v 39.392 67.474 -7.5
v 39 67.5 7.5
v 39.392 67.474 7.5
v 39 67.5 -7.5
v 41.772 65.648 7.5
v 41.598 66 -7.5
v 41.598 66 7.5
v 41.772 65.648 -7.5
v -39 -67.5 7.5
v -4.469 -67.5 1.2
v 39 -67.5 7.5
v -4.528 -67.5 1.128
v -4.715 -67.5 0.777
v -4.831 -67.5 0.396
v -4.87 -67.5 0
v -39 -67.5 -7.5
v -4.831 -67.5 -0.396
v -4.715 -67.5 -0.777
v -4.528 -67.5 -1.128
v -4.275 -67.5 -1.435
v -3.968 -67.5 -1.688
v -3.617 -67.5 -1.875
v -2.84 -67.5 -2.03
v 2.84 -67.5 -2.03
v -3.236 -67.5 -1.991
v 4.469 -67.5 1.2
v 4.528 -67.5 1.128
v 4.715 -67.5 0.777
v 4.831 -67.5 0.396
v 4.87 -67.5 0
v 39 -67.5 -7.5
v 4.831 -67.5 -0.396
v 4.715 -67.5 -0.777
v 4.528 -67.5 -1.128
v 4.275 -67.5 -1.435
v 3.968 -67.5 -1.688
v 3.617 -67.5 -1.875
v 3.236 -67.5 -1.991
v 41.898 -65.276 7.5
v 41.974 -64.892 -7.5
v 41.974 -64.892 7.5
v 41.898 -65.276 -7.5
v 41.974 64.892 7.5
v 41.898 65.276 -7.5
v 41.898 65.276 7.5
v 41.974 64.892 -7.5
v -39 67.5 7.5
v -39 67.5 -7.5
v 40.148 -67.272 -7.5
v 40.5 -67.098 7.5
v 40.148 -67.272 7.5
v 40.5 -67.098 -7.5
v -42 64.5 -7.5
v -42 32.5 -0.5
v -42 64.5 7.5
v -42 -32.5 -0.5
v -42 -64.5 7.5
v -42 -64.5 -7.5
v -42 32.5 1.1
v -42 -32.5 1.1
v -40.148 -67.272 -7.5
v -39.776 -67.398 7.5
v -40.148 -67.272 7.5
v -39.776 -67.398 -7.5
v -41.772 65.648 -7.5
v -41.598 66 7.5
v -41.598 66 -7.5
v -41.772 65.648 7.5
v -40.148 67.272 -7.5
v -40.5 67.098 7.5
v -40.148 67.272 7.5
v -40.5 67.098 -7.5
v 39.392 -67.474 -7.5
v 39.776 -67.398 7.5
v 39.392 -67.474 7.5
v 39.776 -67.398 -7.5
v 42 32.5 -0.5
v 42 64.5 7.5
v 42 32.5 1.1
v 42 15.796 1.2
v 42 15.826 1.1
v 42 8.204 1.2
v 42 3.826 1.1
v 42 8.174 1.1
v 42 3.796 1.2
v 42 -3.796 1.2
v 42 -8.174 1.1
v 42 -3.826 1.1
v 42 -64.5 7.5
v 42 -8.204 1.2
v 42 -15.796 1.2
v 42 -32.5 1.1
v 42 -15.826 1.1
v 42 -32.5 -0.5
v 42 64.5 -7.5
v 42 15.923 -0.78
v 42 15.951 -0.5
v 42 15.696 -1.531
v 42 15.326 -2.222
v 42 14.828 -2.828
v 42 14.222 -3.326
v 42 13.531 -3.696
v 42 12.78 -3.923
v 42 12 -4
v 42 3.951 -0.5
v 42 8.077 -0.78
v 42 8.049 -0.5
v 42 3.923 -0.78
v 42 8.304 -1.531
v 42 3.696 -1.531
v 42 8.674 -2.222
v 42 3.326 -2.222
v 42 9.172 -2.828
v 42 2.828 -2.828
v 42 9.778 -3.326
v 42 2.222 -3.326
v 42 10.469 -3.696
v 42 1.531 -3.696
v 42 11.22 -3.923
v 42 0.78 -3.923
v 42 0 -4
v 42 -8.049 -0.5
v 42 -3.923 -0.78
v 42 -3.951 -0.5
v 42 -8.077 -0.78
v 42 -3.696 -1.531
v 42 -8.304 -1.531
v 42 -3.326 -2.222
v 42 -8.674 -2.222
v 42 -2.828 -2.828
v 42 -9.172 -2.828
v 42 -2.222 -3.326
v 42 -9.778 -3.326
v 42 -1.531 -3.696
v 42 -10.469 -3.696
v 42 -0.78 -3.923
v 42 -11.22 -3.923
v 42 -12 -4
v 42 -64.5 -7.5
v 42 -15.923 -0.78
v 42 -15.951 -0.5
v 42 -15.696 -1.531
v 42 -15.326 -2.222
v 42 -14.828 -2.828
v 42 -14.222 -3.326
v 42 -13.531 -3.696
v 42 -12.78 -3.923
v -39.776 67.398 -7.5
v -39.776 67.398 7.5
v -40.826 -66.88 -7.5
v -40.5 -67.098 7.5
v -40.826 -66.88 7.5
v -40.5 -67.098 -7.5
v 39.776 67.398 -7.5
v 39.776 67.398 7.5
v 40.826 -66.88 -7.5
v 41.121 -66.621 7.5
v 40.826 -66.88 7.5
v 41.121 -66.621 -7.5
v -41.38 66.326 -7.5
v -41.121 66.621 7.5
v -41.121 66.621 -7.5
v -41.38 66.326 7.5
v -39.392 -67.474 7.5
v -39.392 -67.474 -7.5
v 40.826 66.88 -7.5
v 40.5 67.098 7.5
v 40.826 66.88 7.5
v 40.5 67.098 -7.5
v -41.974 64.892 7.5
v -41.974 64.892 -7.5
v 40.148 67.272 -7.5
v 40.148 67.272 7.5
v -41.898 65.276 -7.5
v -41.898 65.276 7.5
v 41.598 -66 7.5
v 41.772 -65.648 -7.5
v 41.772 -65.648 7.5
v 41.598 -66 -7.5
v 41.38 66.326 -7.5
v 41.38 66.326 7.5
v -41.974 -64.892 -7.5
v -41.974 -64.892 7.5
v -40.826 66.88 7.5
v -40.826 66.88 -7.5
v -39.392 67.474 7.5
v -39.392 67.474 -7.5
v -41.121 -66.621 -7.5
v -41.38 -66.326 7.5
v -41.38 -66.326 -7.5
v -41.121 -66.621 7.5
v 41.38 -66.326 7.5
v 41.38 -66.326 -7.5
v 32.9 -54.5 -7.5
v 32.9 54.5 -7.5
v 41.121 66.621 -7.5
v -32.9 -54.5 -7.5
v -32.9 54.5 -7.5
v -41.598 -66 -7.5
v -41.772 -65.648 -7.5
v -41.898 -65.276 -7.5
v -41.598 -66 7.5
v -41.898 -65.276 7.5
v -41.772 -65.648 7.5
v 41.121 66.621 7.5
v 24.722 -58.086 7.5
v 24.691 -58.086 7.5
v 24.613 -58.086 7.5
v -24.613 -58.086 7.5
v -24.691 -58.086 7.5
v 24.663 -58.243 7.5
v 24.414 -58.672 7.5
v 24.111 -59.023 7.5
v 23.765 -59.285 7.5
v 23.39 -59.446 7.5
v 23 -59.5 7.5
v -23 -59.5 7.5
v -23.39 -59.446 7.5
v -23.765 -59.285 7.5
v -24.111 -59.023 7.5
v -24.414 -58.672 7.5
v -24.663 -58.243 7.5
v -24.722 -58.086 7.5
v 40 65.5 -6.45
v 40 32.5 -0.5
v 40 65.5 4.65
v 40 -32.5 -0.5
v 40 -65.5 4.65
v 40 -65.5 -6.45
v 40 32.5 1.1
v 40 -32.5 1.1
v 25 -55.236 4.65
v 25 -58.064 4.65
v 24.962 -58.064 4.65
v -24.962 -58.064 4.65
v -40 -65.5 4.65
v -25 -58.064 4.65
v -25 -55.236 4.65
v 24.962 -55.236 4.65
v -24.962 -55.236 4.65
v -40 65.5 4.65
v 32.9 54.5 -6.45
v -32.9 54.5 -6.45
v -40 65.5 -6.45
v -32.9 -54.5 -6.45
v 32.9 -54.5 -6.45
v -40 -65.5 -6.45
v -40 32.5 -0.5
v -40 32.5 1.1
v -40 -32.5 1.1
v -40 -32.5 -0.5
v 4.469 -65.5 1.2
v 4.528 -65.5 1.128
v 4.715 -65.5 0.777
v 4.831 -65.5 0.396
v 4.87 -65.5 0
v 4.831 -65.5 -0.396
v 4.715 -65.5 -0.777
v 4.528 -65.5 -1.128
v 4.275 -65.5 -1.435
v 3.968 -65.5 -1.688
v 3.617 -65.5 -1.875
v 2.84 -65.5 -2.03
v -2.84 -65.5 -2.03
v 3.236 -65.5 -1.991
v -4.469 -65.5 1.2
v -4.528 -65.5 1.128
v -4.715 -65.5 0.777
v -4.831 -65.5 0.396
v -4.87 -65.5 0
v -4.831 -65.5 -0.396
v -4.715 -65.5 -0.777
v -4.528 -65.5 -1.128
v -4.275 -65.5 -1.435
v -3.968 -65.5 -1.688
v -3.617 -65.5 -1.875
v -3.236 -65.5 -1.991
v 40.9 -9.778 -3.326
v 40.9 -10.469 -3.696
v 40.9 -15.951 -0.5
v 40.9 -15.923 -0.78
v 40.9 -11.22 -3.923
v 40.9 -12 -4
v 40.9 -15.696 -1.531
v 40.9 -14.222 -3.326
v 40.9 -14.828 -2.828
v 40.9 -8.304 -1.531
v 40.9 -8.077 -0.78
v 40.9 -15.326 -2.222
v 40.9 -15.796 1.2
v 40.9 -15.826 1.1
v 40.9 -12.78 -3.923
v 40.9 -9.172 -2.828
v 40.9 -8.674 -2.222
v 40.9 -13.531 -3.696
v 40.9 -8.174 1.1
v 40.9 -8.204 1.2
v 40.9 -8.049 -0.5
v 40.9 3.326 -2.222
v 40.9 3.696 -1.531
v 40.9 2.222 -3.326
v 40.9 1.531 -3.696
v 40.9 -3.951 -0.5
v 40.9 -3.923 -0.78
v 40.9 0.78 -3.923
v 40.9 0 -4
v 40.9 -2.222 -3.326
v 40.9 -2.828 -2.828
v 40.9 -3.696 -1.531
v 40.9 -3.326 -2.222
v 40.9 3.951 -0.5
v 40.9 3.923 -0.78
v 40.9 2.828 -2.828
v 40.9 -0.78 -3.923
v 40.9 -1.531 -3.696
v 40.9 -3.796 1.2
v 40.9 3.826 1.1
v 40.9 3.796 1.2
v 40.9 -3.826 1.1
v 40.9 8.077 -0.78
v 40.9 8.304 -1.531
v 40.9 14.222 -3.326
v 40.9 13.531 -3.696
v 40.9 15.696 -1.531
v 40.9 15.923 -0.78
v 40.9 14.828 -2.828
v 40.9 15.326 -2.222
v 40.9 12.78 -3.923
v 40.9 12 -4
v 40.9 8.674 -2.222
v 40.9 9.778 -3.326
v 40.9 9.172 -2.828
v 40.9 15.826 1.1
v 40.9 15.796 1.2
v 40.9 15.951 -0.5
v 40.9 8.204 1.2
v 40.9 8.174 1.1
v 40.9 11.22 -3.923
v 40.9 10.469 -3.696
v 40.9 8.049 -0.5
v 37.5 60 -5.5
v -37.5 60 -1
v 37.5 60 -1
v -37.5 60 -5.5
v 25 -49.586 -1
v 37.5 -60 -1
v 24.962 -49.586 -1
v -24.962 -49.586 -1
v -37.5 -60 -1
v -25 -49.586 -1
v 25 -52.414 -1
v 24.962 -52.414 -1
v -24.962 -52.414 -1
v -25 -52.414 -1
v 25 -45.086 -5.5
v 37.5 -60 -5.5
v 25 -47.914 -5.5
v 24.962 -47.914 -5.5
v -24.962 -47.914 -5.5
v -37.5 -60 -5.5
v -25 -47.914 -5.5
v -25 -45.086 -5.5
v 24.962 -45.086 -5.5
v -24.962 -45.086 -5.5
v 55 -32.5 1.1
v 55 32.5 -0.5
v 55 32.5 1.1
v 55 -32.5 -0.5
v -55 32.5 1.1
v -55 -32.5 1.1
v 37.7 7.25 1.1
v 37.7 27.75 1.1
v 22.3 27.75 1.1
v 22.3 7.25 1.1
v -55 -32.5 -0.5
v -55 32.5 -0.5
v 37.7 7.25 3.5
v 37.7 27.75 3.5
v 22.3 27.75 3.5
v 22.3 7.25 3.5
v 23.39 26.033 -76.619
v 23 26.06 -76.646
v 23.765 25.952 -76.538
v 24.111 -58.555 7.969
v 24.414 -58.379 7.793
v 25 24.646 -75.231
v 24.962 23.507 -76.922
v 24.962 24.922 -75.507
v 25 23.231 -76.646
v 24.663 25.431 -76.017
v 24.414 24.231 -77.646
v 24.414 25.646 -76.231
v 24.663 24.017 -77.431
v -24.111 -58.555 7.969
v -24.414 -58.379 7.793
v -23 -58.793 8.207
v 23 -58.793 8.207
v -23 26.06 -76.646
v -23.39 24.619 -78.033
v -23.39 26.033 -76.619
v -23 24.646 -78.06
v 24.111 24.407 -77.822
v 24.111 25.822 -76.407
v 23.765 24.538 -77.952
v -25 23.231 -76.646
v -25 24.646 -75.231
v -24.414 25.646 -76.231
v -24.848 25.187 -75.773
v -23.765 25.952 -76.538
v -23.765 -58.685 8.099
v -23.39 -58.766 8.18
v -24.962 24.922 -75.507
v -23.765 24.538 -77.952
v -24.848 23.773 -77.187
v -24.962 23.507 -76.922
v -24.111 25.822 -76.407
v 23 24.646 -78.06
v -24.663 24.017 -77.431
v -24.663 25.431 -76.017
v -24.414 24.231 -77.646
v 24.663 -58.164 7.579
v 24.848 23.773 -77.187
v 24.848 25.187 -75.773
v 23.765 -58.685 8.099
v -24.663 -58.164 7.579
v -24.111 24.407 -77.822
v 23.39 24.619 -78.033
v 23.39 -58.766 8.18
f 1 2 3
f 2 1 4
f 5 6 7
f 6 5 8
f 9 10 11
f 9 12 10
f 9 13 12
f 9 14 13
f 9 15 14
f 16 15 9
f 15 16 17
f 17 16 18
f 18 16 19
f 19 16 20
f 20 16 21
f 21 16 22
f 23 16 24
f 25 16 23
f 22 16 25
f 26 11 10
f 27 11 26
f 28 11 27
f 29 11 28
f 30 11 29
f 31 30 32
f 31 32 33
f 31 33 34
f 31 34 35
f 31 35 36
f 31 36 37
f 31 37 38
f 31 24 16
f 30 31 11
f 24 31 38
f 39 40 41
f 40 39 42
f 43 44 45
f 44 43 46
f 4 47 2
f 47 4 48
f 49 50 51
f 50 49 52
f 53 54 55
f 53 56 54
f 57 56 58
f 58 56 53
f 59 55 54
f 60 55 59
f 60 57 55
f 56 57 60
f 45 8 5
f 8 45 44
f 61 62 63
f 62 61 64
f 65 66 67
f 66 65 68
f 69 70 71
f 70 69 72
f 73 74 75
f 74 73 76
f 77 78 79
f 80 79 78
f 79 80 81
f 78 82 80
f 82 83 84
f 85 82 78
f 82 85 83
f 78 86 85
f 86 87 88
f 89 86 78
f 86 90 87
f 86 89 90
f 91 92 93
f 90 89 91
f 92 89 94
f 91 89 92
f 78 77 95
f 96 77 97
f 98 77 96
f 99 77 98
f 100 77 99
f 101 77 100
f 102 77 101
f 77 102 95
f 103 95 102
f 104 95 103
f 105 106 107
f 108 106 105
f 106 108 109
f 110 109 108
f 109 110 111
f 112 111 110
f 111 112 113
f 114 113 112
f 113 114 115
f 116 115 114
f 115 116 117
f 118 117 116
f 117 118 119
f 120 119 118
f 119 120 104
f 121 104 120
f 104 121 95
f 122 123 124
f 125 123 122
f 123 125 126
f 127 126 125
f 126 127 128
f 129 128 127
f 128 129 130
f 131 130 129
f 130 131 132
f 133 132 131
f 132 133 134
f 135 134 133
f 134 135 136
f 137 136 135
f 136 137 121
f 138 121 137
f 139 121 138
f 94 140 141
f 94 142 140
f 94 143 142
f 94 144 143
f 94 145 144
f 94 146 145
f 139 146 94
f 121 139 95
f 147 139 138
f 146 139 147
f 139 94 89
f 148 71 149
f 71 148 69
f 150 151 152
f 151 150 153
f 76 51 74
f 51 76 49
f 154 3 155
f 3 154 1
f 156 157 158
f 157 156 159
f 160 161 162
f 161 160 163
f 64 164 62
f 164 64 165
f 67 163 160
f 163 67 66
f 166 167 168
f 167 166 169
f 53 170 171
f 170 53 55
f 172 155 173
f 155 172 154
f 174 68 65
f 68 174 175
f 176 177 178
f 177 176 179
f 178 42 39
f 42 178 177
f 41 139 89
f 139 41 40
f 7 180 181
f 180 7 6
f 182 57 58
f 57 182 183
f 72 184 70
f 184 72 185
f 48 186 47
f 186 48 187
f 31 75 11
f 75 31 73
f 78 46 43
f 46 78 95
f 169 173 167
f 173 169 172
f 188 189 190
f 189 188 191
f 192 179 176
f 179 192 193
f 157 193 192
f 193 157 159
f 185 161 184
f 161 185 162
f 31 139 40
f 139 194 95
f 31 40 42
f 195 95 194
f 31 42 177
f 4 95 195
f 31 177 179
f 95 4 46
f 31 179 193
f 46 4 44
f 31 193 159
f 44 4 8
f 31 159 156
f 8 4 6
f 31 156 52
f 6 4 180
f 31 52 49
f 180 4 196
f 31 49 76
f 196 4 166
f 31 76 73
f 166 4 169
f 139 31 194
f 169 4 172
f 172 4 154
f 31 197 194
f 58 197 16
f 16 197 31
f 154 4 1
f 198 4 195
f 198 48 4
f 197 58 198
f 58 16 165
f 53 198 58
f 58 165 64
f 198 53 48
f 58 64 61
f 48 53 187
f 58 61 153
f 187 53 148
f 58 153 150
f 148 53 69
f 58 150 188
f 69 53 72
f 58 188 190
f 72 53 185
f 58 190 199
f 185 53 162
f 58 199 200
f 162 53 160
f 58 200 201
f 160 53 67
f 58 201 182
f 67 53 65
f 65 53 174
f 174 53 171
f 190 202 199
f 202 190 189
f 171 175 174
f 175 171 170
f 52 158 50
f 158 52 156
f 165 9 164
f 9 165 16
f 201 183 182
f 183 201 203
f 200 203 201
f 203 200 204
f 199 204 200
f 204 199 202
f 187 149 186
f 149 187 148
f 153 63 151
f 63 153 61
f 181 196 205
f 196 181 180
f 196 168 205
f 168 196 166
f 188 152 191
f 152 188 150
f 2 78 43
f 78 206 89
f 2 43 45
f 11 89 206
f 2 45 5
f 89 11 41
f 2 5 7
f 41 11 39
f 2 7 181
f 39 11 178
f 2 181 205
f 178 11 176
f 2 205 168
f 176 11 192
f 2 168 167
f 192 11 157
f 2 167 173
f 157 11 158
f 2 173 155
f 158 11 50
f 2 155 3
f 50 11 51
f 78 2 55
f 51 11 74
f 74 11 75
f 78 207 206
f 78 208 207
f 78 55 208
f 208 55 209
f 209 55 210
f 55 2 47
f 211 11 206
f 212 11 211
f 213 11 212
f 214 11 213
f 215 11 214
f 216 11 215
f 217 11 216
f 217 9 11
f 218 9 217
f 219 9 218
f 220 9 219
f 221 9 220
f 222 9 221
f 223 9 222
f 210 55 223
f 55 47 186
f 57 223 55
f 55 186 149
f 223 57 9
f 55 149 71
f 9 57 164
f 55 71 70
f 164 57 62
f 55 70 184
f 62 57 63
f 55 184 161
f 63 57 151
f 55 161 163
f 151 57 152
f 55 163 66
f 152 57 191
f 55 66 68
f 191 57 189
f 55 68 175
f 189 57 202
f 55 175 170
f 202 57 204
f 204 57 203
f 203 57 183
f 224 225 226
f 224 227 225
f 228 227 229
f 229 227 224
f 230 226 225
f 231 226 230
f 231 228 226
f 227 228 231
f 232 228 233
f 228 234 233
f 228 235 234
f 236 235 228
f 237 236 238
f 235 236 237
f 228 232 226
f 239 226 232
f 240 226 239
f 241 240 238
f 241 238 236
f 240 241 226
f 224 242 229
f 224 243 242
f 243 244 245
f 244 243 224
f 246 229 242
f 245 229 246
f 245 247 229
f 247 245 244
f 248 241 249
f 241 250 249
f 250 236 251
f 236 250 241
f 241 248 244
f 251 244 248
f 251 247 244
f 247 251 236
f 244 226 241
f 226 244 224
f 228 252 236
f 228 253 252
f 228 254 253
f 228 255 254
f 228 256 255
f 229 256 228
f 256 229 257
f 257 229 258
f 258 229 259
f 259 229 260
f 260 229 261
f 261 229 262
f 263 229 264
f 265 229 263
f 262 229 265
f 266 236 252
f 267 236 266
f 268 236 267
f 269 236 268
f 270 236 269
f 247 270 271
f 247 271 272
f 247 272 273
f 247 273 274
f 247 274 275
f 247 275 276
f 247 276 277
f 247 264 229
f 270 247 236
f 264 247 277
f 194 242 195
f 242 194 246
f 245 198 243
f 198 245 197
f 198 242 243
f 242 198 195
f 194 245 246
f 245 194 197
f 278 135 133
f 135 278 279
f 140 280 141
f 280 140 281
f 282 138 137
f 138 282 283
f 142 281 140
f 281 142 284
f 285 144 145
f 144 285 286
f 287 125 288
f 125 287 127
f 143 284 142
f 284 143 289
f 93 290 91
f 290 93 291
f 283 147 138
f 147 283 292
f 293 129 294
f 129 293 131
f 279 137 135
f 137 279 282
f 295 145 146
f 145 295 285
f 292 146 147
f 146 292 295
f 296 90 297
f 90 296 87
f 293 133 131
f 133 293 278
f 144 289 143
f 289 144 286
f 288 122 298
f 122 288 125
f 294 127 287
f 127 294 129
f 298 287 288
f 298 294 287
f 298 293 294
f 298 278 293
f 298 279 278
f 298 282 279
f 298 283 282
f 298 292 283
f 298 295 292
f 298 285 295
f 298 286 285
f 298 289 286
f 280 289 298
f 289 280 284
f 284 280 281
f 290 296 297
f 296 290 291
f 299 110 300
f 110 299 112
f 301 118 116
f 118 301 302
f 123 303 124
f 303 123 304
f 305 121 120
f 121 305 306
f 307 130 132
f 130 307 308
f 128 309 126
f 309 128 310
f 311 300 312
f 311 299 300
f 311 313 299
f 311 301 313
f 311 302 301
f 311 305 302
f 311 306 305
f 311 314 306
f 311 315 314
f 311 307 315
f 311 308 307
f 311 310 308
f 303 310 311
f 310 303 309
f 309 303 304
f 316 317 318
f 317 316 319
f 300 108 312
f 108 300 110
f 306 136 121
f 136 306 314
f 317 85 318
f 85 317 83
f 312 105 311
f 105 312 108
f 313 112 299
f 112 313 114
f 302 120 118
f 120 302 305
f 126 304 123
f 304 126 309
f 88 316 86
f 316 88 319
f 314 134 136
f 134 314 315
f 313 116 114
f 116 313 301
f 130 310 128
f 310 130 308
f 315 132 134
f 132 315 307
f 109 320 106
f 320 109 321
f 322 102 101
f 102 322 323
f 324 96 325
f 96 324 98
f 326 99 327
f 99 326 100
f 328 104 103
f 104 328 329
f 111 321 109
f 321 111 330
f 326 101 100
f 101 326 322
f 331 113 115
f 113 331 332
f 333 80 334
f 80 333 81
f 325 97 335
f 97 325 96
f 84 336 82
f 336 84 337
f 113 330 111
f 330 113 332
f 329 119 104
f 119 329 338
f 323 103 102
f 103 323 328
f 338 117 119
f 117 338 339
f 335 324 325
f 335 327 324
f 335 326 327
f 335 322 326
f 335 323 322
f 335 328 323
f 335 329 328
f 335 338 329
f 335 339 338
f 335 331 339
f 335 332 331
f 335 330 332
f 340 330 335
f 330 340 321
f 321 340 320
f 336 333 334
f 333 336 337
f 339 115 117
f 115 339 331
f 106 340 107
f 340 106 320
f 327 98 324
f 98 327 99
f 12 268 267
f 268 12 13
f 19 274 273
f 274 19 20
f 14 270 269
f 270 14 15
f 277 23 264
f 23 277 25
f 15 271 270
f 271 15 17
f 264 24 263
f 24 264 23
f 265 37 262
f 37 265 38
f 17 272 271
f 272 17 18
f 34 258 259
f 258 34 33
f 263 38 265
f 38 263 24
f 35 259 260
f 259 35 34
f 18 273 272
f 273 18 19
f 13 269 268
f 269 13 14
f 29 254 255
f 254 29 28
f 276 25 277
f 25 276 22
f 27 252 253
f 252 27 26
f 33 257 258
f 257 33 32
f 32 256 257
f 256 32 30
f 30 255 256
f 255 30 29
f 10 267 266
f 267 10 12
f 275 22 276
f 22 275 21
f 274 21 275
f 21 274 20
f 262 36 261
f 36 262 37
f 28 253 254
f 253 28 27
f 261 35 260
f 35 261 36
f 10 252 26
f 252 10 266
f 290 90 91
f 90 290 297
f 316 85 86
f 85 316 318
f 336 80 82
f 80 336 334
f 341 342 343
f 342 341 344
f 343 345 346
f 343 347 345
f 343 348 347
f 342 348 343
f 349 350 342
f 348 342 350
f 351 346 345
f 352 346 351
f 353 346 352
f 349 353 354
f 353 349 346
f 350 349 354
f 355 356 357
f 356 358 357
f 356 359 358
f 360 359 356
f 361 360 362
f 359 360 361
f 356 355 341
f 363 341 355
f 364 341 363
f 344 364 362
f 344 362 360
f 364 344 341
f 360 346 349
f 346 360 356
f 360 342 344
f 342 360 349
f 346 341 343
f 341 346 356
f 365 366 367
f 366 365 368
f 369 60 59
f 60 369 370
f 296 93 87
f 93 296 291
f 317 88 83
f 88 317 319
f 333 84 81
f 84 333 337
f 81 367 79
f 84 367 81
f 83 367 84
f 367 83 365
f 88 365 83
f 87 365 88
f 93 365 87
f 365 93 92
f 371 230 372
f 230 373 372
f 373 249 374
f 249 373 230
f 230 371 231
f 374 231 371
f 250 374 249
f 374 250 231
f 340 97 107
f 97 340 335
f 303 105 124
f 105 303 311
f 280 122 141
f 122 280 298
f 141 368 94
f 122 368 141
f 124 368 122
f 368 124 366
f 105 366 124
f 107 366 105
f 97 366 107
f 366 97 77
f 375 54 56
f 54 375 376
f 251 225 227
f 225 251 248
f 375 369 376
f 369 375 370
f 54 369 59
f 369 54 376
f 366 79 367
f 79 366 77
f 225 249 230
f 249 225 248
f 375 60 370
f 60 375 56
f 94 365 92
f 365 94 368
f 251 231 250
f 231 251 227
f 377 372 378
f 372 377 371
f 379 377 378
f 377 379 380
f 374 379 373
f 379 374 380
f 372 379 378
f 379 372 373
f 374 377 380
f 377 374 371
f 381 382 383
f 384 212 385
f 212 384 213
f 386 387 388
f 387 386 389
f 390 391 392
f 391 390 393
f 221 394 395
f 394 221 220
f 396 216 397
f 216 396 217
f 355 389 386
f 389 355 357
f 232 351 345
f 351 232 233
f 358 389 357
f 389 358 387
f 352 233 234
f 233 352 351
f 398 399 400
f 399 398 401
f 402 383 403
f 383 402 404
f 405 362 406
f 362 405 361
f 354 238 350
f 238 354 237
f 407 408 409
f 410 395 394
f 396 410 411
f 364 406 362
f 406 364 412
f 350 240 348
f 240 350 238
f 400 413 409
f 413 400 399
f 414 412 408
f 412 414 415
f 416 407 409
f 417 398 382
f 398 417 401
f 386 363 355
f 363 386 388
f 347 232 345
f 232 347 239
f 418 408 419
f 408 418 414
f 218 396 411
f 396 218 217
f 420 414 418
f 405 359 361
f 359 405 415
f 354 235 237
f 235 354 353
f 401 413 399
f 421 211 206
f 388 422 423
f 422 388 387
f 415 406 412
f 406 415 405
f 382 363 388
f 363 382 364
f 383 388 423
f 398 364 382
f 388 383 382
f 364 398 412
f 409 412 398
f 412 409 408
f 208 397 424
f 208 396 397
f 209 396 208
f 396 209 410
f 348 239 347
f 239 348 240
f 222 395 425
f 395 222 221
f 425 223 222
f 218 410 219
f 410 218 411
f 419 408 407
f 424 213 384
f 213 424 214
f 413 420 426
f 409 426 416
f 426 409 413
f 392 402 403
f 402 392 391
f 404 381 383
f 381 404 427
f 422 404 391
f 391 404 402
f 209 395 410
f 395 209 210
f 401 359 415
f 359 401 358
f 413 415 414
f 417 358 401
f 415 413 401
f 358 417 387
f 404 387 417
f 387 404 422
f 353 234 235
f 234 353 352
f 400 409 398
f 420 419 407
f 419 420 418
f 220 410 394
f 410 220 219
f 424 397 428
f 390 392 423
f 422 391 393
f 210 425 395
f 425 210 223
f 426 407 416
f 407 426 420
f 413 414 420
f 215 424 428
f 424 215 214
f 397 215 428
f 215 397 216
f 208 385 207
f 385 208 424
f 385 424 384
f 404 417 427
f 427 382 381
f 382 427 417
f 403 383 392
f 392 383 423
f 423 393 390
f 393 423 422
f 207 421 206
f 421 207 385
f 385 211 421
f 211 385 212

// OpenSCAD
union() {
	color(alpha = 0.9, c = "LightGray") {
		difference() {
			difference() {
				difference() {
					difference() {
						difference() {
							hull() {
								translate(v = [-39.0, -64.5, 0]) {
									cylinder($fn = 48, center = true, h = 15.0, r = 3.0);
								}
								translate(v = [-39.0, 64.5, 0]) {
									cylinder($fn = 48, center = true, h = 15.0, r = 3.0);
								}
								translate(v = [39.0, -64.5, 0]) {
									cylinder($fn = 48, center = true, h = 15.0, r = 3.0);
								}
								translate(v = [39.0, 64.5, 0]) {
									cylinder($fn = 48, center = true, h = 15.0, r = 3.0);
								}
							}
							translate(v = [0, 0, -0.9]) {
								cube(center = true, size = [80.0, 131.0, 11.1]);
							}
						}
						translate(v = [0, 0, -3.0]) {
							cube(center = true, size = [75.4, 120.4, 5.1]);
						}
					}
					translate(v = [0, 0, -6.5]) {
						cube(center = true, size = [65.8, 109.0, 2.2]);
					}
				}
				union() {
					translate(v = [42.0, -12.0, 0]) {
						rotate(a = [0, 90, 0]) {
							cylinder($fn = 32, center = true, d = 8.0, h = 2.2);
						}
					}
					translate(v = [42.0, 0.0, 0]) {
						rotate(a = [0, 90, 0]) {
							cylinder($fn = 32, center = true, d = 8.0, h = 2.2);
						}
					}
					translate(v = [42.0, 12.0, 0]) {
						rotate(a = [0, 90, 0]) {
							cylinder($fn = 32, center = true, d = 8.0, h = 2.2);
						}
					}
				}
			}
			translate(v = [0, -67.5, 0]) {
				rotate(a = [90, 0, 0]) {
					linear_extrude(center = true, height = 15.2) {
						hull() {
							translate(v = [-2.84, 0]) {
								circle($fn = 32, r = 2.0300000000000002);
							}
							translate(v = [2.84, 0]) {
								circle($fn = 32, r = 2.0300000000000002);
							}
						}
					}
				}
			}
		}
	}
	color(alpha = 0.85, c = "DarkGray") {
		difference() {
			difference() {
				translate(v = [0, 0, 4.35]) {
					hull() {
						translate(v = [-39.0, -64.5, 0]) {
							cylinder($fn = 48, center = true, h = 6.3, r = 3.0);
						}
						translate(v = [-39.0, 64.5, 0]) {
							cylinder($fn = 48, center = true, h = 6.3, r = 3.0);
						}
						translate(v = [39.0, -64.5, 0]) {
							cylinder($fn = 48, center = true, h = 6.3, r = 3.0);
						}
						translate(v = [39.0, 64.5, 0]) {
							cylinder($fn = 48, center = true, h = 6.3, r = 3.0);
						}
					}
				}
				translate(v = [0, 0, 3.3500000000000005]) {
					cube(center = true, size = [80.0, 131.0, 4.3999999999999995]);
				}
			}
			translate(v = [0, 0.7999999999999972, 6.35]) {
				cube(center = true, size = [50.6, 120.6, 2.4]);
			}
		}
	}
	color(alpha = 0.75, c = "Gray") {
		translate(v = [0, -59.5, 7.5]) {
			rotate(a = [-45, 0, 0]) {
				translate(v = [0, 60.0, 0]) {
					hull() {
						translate(v = [-23.0, -58.0, 0]) {
							cylinder($fn = 32, center = true, h = 2.0, r = 2.0);
						}
						translate(v = [-23.0, 58.0, 0]) {
							cylinder($fn = 32, center = true, h = 2.0, r = 2.0);
						}
						translate(v = [23.0, -58.0, 0]) {
							cylinder($fn = 32, center = true, h = 2.0, r = 2.0);
						}
						translate(v = [23.0, 58.0, 0]) {
							cylinder($fn = 32, center = true, h = 2.0, r = 2.0);
						}
					}
				}
			}
		}
	}
	translate(v = [0, 0, -3.25]) {
		rotate(a = [0, 0, 90]) {
			union() {
				color(alpha = 0.5, c = "DodgerBlue") {
					cube(center = true, size = [120.0, 75.0, 4.5]);
				}
				color(alpha = 0.7, c = "LightBlue") {
					translate(v = [0, 0, 1.75]) {
						cube(center = true, size = [108.0, 64.8, 1.0]);
					}
				}
			}
		}
	}
	translate(v = [0, 0, 0.30000000000000004]) {
		union() {
			color(alpha = 0.5, c = "ForestGreen") {
				cube(center = true, size = [110.0, 65.0, 1.6]);
			}
			color(alpha = 0.6, c = "DarkGreen") {
				translate(v = [30.0, 17.5, 2.0]) {
					cube(center = true, size = [15.4, 20.5, 2.4]);
				}
			}
		}
	}
}
